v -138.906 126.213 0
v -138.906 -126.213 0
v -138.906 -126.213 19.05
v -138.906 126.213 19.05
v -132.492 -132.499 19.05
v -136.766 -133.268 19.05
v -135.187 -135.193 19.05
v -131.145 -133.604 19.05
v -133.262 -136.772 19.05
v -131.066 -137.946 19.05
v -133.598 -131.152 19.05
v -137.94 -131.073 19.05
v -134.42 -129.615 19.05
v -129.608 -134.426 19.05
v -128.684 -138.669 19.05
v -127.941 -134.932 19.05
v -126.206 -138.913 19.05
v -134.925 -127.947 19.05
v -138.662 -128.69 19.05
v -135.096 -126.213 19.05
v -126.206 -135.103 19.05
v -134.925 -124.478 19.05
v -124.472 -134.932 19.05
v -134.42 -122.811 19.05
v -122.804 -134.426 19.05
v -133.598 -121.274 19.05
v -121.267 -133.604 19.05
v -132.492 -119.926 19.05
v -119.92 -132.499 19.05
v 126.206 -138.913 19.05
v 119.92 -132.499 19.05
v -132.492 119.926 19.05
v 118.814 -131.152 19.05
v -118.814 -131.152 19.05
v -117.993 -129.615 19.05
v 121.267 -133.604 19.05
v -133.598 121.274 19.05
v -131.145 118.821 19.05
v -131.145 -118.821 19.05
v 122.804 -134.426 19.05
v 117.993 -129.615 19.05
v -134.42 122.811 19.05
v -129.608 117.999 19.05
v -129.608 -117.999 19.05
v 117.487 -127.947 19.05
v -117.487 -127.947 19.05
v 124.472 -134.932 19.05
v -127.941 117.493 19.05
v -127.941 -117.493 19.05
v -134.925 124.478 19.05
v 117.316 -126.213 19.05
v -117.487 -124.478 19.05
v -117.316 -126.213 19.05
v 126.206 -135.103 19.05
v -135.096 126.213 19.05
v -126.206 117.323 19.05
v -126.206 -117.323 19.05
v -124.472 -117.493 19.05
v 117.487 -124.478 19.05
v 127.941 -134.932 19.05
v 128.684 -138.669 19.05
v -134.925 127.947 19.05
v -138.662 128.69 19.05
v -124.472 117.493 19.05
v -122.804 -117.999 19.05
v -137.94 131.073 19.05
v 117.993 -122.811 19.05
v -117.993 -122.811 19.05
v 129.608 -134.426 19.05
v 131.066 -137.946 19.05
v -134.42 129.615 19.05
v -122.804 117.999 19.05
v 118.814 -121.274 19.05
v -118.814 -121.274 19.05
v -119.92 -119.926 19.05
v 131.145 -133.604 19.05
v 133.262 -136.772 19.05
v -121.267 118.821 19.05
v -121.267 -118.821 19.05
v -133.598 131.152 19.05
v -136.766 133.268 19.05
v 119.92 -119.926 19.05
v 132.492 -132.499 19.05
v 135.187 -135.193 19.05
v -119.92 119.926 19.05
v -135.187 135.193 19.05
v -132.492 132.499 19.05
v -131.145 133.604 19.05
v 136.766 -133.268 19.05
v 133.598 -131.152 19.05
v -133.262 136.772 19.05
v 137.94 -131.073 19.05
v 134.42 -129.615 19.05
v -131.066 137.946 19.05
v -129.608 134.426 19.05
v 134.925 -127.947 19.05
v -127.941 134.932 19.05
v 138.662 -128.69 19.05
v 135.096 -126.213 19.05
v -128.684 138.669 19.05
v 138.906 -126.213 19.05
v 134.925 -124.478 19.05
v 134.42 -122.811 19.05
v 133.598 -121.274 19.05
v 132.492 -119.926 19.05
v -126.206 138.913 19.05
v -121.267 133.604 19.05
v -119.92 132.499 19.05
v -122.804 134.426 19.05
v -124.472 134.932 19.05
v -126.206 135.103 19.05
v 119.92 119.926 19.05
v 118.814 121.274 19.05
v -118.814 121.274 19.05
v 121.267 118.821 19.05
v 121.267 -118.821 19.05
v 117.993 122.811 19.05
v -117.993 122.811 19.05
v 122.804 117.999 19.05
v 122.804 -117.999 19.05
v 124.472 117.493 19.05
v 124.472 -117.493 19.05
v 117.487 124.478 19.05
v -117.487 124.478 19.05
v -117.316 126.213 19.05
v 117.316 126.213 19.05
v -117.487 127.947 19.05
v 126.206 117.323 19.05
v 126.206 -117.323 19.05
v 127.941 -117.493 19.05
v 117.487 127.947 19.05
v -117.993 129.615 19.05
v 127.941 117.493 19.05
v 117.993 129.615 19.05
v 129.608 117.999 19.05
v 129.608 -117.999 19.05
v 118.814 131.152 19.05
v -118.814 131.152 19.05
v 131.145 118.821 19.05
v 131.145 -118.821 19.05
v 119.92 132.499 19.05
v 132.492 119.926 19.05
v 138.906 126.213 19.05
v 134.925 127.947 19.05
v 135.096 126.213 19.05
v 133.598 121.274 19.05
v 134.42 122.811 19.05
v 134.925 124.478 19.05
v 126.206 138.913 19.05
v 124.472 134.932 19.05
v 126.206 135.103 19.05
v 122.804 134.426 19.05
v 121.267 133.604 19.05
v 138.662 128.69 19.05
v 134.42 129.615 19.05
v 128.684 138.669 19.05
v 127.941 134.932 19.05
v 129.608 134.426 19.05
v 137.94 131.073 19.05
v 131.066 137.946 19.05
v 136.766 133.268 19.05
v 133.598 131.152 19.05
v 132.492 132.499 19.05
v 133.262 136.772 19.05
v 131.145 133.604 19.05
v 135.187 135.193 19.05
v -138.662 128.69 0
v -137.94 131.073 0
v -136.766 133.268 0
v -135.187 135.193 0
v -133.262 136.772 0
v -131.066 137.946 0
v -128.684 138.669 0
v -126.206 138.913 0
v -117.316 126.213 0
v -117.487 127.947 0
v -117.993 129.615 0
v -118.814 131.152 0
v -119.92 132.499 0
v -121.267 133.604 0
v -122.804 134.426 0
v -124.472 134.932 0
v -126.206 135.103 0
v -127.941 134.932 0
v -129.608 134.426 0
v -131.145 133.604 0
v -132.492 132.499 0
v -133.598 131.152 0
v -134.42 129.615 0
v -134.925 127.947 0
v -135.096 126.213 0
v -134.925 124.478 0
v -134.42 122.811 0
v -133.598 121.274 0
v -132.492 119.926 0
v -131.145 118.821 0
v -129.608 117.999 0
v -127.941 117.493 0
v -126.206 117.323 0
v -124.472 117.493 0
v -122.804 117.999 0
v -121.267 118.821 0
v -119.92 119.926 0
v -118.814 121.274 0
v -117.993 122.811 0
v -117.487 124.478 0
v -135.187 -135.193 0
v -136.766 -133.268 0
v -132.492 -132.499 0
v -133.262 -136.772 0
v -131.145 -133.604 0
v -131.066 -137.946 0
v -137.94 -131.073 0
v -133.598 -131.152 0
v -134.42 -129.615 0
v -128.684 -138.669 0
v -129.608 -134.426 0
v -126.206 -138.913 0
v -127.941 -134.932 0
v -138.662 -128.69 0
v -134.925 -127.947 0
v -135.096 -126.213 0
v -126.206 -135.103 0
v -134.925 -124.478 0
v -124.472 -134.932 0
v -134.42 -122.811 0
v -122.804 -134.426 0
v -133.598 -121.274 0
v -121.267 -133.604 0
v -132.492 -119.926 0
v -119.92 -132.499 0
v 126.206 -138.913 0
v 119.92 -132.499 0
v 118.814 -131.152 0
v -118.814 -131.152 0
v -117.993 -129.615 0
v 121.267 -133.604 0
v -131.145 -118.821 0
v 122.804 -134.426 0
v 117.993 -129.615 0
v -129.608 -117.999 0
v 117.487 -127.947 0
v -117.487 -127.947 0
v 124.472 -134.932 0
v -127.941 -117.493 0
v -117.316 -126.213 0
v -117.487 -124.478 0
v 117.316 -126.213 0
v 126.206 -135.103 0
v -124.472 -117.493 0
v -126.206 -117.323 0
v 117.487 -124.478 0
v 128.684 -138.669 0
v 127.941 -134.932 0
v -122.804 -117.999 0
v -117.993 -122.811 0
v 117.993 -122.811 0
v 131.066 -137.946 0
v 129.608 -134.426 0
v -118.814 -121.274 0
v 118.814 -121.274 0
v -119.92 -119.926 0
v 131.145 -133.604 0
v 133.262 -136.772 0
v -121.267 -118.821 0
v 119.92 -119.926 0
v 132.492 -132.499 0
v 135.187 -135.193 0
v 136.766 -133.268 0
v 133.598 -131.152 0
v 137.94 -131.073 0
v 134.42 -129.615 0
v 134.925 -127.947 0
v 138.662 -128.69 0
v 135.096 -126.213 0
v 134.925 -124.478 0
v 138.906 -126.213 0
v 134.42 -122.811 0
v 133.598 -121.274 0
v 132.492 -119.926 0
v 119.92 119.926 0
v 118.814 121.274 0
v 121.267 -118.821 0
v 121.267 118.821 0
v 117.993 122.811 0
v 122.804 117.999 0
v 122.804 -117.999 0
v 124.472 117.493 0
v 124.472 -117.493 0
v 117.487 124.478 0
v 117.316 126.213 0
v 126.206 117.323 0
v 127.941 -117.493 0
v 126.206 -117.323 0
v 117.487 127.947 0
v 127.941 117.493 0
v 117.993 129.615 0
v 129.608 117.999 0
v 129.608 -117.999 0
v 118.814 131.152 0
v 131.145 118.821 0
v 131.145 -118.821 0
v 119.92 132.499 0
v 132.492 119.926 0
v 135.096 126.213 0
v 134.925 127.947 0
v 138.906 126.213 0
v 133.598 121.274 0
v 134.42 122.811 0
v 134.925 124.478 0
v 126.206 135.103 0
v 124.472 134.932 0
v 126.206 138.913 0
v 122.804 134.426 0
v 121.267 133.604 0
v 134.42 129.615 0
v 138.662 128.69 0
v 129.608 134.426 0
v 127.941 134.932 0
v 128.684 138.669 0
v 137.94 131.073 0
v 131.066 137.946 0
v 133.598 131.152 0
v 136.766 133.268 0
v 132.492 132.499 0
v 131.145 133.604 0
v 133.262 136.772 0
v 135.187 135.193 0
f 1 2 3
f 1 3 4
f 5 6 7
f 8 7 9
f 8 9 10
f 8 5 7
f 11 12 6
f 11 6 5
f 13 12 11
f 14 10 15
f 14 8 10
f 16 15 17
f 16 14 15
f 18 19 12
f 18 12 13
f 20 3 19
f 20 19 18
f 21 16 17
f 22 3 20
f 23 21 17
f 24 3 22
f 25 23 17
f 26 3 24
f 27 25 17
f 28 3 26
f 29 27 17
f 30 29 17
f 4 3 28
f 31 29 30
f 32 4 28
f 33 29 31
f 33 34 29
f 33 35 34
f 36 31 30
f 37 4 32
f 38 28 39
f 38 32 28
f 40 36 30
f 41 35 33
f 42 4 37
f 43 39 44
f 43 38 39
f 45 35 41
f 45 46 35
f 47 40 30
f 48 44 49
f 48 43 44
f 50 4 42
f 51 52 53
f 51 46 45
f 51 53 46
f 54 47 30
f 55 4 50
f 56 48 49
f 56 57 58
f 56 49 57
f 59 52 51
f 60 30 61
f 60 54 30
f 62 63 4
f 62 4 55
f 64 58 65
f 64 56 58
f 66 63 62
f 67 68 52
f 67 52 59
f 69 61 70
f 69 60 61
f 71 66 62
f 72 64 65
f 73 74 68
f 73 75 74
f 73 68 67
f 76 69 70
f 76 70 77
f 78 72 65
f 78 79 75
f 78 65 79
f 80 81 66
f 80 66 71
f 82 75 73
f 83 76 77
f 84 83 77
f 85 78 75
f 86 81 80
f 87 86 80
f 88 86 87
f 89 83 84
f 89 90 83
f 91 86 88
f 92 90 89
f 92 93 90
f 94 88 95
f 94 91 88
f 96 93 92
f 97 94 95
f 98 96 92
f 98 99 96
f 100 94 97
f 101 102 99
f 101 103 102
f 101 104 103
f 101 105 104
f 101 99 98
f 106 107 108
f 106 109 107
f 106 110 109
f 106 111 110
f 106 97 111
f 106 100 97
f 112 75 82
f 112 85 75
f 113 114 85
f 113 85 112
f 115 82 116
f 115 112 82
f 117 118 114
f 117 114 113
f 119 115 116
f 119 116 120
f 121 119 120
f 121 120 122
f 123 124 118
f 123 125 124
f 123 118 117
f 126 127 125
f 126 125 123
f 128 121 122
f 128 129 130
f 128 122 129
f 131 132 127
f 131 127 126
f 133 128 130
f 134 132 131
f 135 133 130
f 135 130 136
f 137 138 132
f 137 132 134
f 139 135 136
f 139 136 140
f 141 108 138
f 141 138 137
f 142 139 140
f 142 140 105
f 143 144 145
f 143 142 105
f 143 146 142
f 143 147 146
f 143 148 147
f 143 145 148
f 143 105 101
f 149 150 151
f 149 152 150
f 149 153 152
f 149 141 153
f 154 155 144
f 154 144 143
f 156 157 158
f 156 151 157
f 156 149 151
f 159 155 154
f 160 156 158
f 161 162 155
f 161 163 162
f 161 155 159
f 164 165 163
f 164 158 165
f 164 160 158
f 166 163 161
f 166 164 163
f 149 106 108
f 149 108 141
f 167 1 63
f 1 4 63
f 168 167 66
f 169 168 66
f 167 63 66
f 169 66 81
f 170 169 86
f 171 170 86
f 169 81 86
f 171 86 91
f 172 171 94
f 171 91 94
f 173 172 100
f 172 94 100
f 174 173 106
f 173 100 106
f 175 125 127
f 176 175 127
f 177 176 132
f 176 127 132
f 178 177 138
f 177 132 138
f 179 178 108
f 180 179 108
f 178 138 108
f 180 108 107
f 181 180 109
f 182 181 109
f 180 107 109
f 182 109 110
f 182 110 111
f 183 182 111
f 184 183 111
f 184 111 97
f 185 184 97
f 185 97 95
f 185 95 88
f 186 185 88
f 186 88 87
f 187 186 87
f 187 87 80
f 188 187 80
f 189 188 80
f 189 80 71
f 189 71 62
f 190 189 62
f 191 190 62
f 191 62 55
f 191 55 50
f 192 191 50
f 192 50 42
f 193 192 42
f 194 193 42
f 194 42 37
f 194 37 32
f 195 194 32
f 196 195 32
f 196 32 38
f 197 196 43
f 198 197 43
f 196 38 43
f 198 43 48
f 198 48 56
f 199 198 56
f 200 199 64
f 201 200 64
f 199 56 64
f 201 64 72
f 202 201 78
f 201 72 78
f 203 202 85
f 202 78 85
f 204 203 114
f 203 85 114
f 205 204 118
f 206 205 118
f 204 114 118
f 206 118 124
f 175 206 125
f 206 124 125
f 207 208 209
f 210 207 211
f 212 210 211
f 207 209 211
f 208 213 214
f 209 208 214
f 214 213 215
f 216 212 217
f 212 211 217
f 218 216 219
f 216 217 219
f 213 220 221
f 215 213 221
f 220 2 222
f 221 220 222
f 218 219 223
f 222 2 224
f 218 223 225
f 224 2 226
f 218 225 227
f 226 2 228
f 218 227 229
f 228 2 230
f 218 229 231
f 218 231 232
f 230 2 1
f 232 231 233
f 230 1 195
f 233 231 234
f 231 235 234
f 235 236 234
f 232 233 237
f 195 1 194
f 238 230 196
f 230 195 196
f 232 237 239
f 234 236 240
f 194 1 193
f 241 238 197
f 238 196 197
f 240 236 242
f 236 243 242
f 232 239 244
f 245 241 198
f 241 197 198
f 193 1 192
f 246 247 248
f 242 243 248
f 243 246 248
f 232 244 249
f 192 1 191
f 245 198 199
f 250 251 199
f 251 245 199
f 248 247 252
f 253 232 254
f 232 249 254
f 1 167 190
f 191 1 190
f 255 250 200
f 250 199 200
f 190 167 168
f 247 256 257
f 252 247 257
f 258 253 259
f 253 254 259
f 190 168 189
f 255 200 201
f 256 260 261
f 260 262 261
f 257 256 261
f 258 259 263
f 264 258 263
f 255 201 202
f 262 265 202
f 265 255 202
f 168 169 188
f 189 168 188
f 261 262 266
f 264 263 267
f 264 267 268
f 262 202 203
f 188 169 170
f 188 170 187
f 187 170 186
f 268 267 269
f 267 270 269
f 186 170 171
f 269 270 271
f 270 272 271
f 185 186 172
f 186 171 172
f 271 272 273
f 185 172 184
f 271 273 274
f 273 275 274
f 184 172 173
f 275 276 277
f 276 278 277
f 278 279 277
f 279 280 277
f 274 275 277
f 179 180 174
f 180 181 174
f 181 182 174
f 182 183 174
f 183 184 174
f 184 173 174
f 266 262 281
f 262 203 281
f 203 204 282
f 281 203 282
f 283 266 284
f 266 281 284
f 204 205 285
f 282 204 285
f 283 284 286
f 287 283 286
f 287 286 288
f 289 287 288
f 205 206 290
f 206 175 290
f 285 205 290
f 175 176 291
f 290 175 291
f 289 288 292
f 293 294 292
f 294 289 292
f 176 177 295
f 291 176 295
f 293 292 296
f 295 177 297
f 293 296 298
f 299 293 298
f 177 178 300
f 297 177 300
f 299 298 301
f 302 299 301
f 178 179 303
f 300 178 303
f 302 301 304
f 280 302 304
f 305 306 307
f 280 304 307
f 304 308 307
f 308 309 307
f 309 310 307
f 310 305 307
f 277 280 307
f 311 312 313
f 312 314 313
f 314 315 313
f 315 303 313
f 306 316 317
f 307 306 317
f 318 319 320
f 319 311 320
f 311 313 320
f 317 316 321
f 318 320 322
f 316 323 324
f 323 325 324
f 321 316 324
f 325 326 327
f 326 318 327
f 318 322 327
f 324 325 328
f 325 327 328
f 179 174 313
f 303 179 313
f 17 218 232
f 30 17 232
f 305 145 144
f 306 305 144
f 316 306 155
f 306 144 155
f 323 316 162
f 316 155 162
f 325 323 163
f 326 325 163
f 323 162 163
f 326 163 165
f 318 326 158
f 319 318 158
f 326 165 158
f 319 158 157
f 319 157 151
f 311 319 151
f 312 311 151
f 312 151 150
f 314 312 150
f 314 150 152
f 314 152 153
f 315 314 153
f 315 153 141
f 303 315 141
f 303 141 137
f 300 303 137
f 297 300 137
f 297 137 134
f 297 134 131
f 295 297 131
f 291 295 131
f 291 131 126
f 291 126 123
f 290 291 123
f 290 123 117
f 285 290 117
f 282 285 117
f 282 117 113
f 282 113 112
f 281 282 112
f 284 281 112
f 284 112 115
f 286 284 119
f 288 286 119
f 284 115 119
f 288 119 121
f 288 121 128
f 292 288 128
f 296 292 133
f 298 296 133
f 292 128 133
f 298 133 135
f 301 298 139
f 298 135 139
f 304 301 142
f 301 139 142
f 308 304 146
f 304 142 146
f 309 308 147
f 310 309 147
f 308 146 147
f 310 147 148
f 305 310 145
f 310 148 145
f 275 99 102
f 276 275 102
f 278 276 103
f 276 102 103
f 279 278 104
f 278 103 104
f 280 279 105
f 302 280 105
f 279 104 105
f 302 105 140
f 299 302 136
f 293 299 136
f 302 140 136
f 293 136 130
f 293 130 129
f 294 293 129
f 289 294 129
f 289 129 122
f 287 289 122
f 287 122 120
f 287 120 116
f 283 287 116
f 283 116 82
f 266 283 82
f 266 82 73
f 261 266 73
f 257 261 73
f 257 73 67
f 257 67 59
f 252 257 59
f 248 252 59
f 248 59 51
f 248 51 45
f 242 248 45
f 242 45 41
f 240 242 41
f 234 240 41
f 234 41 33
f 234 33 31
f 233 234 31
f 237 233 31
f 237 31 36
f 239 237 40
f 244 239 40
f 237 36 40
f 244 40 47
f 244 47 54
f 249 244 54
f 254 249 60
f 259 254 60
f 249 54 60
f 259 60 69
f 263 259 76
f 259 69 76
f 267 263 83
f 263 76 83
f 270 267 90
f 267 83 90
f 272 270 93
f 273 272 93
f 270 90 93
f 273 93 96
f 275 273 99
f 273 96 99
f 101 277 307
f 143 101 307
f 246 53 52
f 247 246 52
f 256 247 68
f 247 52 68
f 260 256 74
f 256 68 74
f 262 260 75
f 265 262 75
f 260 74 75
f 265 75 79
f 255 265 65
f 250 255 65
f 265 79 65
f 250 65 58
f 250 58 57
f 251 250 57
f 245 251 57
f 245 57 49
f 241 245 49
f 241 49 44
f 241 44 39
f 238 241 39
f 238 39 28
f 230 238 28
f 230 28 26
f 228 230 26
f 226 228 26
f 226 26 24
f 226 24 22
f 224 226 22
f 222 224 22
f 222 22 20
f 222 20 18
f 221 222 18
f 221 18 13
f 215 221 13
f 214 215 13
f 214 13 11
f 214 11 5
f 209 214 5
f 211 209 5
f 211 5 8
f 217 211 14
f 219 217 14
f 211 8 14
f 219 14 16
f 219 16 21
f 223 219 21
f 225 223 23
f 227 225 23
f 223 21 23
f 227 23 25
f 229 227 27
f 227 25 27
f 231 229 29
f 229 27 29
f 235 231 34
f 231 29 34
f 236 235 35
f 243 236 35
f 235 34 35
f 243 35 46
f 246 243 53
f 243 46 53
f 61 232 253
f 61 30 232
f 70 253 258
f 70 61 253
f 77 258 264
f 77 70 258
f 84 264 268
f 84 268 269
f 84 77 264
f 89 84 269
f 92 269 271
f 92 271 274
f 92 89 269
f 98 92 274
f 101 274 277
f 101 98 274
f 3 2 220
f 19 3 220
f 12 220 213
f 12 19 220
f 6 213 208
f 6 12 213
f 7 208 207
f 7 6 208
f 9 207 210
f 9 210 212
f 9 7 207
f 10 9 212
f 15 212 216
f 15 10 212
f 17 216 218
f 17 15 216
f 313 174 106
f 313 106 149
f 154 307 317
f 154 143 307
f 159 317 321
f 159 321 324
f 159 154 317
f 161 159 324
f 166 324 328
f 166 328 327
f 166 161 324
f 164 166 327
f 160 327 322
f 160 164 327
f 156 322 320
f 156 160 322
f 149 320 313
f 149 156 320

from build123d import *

# Parameters (mm, degrees)
F0_W     = 277.8125
F0_H     = 277.8252
F1_DEPTH = 19.05
F2_R     = 12.7
F3_R     = 8.89
F4_DEPTH = 25.4


with BuildPart() as f1:
    # F0 (on Top) → F1 (new body)
    with BuildSketch(Plane.XY):
        Rectangle(F0_W, F0_H)
    extrude(amount=F1_DEPTH)

    # F2
    f2_edges = [f1.edges().sort_by_distance(p)[0] for p in [
        (-138.90625, -138.9126, 9.525),
        (-138.90625, 138.9126, 9.525),
        (138.90625, 138.9126, 9.525),
        (138.90625, -138.9126, 9.525),
    ]]
    fillet(f2_edges, radius=F2_R)

    # F3 (on face) → F4 (cut)
    with BuildSketch(Plane.XY.offset(19.05)):
        with Locations((-126.20625, 126.2126)):
            Circle(F3_R)
        with Locations((126.20625, 126.2126)):
            Circle(F3_R)
        with Locations((126.20625, -126.2126)):
            Circle(F3_R)
        with Locations((-126.20625, -126.2126)):
            Circle(F3_R)
    extrude(amount=-F4_DEPTH, mode=Mode.SUBTRACT)


solid = f1.part
